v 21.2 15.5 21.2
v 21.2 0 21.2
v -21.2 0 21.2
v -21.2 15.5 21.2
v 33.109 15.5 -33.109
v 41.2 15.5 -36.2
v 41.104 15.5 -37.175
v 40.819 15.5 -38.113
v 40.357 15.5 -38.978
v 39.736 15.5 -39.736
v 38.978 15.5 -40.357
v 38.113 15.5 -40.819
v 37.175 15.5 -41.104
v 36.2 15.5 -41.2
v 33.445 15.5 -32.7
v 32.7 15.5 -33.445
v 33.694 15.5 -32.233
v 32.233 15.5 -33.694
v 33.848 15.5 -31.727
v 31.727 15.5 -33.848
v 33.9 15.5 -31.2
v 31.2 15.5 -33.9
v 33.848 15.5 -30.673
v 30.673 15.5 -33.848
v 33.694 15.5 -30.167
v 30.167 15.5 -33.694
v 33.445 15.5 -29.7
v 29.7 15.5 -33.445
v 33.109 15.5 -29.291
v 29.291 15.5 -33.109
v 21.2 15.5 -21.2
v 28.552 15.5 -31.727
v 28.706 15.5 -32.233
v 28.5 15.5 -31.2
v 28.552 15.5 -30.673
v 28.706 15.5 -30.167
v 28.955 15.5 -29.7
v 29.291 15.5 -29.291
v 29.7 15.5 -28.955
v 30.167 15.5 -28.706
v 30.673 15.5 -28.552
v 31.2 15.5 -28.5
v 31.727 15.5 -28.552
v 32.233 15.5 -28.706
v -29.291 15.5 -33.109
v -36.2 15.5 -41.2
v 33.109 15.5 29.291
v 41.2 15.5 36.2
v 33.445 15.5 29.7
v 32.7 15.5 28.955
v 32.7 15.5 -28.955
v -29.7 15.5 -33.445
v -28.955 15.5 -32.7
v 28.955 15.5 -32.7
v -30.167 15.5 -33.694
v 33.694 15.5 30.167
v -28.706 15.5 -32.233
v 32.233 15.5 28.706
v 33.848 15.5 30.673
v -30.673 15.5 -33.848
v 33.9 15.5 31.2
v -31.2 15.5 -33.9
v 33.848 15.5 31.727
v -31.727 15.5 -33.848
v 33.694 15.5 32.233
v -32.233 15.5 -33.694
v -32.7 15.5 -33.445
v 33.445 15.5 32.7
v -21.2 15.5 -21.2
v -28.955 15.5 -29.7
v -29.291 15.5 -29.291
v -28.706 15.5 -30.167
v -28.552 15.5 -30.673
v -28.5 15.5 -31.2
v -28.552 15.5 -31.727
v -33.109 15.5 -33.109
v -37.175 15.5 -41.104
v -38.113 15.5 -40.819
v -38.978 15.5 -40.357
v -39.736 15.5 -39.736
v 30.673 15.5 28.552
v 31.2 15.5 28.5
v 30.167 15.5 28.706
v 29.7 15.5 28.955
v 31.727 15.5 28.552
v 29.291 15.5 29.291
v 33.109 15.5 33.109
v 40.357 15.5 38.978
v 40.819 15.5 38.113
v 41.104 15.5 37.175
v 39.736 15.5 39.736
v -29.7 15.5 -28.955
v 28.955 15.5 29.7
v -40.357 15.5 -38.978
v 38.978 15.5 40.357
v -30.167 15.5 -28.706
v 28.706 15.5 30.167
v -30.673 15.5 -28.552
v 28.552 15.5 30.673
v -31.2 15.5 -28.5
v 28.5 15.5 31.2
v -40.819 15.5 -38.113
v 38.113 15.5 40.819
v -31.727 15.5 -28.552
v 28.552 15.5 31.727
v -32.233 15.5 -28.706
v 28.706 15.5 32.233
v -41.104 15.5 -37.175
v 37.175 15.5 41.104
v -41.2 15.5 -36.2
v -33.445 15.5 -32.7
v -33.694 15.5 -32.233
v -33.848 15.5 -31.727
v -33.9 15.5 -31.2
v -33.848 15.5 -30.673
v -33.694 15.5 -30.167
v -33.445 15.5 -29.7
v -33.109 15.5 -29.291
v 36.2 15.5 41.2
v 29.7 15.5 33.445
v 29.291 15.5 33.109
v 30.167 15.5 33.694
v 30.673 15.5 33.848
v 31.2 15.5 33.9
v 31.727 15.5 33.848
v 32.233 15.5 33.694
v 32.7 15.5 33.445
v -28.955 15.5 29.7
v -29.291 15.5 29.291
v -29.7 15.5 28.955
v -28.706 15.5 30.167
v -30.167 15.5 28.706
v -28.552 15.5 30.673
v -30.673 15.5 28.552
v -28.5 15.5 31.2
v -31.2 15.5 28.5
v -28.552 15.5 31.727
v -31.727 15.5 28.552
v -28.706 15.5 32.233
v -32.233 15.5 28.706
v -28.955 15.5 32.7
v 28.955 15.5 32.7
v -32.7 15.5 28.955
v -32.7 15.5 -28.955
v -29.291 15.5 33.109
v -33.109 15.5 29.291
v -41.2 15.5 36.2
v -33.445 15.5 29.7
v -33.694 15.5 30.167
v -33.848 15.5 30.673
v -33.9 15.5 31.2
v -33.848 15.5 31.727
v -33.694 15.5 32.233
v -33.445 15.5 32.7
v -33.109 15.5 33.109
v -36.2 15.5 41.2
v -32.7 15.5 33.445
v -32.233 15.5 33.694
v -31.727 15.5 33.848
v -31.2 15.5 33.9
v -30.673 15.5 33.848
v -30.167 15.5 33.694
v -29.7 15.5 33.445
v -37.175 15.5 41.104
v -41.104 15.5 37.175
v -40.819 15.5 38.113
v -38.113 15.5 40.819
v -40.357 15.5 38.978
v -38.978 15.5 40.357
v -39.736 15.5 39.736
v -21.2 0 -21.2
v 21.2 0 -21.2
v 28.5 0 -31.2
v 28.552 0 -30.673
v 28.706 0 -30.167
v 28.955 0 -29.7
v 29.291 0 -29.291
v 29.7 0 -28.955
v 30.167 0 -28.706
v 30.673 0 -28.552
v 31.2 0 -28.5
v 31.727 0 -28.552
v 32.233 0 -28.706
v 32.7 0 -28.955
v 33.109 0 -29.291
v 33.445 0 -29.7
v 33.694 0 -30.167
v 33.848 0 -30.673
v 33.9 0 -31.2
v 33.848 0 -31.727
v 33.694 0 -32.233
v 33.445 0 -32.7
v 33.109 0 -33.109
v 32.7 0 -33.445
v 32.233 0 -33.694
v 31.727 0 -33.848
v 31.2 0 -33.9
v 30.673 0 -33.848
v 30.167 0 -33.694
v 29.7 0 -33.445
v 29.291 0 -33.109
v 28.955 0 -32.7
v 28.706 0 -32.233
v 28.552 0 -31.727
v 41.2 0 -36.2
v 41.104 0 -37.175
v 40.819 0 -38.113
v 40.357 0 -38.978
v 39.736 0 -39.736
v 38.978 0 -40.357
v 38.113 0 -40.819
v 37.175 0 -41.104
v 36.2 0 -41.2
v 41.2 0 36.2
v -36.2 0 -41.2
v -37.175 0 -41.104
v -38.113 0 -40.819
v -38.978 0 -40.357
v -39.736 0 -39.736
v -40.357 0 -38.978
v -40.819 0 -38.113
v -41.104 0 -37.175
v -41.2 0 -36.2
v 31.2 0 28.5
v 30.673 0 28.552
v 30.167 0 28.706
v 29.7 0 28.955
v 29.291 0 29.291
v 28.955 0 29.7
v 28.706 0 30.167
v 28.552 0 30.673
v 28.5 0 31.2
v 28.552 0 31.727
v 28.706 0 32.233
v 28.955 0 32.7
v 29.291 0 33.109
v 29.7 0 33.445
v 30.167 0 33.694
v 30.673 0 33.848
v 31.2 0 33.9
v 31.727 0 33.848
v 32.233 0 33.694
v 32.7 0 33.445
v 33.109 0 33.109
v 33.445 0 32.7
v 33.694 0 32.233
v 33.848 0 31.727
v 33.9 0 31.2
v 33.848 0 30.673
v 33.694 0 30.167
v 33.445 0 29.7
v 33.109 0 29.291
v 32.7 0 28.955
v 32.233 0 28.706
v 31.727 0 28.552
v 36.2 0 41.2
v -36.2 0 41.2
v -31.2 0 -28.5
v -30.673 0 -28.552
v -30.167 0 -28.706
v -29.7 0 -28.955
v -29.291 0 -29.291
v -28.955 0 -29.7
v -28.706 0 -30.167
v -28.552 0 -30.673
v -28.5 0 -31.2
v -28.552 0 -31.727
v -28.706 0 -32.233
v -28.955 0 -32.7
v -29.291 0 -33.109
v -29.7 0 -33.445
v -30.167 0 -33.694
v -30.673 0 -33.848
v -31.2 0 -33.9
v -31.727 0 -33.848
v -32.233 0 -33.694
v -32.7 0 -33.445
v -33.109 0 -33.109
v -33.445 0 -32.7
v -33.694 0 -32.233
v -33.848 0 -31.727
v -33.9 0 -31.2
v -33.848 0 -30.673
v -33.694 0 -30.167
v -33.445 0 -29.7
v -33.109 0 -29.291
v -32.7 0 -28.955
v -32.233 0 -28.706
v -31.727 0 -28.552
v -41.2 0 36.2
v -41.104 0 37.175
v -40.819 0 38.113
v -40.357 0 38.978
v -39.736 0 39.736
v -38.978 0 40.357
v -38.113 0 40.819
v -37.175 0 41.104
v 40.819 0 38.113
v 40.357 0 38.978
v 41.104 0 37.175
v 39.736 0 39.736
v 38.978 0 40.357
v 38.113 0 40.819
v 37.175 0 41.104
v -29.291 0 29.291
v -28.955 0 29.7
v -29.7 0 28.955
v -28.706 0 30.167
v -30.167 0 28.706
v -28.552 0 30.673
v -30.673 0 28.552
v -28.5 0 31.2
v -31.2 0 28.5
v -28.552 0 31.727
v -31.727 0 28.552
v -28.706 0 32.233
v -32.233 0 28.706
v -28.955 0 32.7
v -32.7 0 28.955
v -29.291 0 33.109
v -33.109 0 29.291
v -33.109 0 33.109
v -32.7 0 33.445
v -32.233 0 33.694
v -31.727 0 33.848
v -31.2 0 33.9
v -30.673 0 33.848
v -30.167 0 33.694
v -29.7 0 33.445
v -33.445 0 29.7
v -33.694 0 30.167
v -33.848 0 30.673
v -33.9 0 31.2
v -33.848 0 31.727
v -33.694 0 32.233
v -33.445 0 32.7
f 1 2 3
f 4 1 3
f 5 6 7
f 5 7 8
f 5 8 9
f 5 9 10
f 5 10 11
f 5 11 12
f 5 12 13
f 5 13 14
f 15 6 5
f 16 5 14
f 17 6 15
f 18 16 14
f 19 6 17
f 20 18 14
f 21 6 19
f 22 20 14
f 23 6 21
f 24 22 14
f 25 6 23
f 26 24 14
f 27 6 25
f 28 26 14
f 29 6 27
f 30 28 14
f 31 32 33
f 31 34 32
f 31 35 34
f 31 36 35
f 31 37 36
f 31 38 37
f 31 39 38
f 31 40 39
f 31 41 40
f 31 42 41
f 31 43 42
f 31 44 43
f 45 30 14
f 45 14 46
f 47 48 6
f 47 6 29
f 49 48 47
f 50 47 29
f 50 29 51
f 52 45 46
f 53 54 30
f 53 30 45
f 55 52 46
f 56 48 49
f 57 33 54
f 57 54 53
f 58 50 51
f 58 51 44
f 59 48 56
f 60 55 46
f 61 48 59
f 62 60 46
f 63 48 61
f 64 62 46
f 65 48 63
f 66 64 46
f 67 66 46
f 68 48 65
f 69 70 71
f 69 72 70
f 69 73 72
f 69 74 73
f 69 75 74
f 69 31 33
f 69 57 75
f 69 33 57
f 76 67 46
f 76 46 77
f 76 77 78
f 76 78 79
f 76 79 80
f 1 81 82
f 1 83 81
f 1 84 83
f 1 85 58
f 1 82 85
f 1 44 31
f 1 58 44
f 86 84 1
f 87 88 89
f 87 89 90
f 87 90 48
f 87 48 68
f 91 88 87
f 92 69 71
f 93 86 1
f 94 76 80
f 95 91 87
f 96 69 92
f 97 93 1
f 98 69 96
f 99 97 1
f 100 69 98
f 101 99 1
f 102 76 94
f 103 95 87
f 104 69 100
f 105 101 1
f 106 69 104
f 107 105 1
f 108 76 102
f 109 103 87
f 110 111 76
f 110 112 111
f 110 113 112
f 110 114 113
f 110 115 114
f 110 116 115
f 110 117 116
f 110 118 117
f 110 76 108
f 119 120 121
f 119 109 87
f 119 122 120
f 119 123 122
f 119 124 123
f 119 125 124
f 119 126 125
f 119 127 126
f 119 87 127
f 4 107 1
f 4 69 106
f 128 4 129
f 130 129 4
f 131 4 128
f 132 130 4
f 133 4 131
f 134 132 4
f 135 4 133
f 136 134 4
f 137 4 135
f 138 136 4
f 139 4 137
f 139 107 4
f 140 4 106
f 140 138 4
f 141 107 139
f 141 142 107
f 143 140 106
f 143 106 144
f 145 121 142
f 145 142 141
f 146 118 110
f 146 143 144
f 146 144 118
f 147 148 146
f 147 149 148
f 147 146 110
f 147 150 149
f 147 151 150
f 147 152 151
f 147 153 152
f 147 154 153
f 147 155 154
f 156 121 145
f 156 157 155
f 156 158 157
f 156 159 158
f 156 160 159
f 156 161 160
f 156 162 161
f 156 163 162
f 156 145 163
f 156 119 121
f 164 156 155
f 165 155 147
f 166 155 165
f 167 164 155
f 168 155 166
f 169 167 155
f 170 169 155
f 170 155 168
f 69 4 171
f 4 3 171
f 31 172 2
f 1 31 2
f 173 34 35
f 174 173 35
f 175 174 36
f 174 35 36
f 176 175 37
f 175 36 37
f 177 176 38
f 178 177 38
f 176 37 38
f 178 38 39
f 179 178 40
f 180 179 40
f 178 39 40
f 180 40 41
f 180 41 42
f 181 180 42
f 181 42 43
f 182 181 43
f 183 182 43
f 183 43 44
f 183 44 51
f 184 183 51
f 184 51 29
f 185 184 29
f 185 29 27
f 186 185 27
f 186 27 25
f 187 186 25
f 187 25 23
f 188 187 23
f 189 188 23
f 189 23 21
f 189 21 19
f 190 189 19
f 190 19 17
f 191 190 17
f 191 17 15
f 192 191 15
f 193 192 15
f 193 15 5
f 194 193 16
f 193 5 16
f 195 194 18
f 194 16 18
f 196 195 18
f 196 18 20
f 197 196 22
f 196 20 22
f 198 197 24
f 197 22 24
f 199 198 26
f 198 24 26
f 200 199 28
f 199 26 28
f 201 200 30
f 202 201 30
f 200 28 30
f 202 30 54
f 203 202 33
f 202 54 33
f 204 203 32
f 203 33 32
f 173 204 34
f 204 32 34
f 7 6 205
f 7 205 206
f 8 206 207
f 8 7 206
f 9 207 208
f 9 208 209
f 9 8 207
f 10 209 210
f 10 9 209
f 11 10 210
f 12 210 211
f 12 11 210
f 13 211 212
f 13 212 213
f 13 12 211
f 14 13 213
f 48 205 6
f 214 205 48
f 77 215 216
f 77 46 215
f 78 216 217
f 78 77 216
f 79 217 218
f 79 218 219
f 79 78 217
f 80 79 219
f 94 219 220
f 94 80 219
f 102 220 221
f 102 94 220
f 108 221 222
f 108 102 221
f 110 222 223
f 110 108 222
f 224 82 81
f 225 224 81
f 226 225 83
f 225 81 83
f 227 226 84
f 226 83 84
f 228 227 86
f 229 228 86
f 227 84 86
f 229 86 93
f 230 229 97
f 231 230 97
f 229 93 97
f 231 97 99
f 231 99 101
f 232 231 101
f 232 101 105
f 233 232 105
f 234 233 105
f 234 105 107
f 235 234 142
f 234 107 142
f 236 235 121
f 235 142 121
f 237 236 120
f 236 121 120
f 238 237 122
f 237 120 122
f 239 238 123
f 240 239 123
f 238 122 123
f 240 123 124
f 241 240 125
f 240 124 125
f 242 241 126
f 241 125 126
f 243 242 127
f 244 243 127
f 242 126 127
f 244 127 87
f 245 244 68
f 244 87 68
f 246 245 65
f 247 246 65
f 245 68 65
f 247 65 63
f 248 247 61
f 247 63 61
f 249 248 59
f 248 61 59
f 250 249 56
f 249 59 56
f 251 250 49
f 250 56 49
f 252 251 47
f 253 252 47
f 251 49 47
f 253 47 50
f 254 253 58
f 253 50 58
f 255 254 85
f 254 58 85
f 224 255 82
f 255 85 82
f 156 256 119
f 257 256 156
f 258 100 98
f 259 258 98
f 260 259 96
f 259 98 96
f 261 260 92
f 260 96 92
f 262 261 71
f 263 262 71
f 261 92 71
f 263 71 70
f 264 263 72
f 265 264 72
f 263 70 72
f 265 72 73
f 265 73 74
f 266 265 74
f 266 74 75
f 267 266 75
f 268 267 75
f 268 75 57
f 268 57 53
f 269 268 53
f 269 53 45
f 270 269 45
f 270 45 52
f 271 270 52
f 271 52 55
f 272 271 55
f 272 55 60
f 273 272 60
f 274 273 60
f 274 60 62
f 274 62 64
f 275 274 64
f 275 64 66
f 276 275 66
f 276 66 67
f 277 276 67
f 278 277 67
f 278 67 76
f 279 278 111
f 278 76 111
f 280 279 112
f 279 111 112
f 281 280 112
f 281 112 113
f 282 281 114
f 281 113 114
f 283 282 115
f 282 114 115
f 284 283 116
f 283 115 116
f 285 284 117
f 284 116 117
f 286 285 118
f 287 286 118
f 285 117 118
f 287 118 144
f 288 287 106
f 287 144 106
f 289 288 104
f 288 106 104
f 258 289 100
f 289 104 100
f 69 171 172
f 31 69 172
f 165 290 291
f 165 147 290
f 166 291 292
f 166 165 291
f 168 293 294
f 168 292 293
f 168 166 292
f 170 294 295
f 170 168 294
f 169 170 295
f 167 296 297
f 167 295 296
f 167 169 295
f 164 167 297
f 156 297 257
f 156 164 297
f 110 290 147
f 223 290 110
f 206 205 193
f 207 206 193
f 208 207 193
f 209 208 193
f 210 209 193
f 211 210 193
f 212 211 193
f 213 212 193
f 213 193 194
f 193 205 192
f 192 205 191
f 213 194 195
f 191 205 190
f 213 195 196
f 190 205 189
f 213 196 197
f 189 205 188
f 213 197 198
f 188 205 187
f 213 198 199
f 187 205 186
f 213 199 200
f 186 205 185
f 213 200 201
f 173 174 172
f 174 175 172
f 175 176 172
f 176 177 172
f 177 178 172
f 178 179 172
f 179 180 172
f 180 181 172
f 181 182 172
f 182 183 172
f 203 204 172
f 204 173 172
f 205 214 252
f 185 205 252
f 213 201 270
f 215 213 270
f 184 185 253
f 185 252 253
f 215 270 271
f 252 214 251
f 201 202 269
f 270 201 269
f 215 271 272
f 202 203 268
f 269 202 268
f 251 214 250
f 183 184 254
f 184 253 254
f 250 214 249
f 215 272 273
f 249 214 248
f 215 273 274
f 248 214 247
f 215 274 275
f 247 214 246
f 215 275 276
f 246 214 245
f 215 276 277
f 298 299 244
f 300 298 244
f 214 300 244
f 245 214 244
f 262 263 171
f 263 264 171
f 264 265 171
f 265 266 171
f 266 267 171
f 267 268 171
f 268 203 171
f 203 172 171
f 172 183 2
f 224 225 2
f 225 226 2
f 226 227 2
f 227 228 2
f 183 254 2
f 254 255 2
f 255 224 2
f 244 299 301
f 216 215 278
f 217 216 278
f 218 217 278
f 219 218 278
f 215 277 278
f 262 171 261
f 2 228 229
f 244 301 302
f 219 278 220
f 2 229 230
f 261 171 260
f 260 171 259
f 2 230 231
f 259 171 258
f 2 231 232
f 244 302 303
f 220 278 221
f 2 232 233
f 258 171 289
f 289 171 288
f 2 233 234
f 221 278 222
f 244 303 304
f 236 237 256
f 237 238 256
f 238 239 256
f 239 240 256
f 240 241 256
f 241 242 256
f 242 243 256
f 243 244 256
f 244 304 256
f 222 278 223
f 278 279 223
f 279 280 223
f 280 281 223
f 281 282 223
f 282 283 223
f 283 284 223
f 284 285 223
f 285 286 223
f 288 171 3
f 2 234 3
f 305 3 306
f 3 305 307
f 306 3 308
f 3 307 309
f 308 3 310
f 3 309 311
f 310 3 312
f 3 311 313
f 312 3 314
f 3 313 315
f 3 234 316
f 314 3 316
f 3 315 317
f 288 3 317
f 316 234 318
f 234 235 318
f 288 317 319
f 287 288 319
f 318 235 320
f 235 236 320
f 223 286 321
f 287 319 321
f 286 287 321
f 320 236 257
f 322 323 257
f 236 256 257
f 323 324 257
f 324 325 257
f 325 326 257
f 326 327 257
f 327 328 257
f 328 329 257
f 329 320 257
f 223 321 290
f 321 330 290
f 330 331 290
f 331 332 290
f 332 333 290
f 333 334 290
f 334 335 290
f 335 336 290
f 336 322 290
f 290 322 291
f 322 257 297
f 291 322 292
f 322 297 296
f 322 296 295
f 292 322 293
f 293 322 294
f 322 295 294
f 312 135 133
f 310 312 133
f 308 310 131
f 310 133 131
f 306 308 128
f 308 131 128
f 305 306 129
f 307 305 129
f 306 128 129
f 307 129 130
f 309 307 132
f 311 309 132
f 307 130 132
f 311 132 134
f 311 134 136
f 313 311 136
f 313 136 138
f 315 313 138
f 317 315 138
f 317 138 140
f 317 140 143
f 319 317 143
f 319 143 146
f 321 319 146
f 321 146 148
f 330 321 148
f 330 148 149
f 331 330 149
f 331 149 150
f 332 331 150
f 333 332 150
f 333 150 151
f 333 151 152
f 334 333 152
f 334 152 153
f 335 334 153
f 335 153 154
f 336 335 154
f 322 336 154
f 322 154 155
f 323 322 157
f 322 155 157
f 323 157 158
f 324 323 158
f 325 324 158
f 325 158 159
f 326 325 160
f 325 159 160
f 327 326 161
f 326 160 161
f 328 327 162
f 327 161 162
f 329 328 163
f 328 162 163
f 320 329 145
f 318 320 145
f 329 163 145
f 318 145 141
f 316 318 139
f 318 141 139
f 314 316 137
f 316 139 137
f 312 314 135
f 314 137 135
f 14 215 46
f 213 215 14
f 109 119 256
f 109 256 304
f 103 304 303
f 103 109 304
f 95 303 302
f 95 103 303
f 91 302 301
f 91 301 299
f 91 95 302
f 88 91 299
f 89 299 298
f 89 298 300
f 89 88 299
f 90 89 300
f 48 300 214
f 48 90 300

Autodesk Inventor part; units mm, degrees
ref_plane "YZ Plane" through (0, 0, 0) normal (1, 0, 0) x (0, 1, 0)
ref_plane "XZ Plane" through (0, 0, 0) normal (0, 1, 0) x (-1, 0, 0)
ref_plane "XY Plane" through (0, 0, 0) normal (0, 0, 1) x (1, 0, 0)
sketch "Boceto1" plane through (0, 0, 0) normal (0, 1, 0) x (-1, 0, 0)
  line L0 (-41.2, 41.2) -> (41.2, 41.2)
  line L1 (41.2, 41.2) -> (41.2, -41.2)
  line L2 (41.2, -41.2) -> (-41.2, -41.2)
  line L3 (-41.2, -41.2) -> (-41.2, 41.2)
  line L4 (-41.2, 41.2) -> (41.2, -41.2) construction
  line L5 (41.2, 41.2) -> (-41.2, -41.2) construction
  line L6 (-21.2, 21.2) -> (21.2, 21.2)
  line L7 (21.2, 21.2) -> (21.2, -21.2)
  line L8 (21.2, -21.2) -> (-21.2, -21.2)
  line L9 (-21.2, -21.2) -> (-21.2, 21.2)
  line L10 (-21.2, 21.2) -> (21.2, -21.2) construction
  line L11 (21.2, 21.2) -> (-21.2, -21.2) construction
  point P0 (0, 0)
  dimension "d0" = 82.4
  dimension "d1" = 82.4
  dimension "d2" = 42.4
  dimension "d3" = 42.4
extrude "Extrusión1" add sketch "Boceto1" along normal blind 15.5
sketch "Boceto2" plane through (0, 15.5, 0) normal (0, 1, 0) x (1, 0, 0)
  circle A0 centre (-31.2, -31.2) radius 2.7
  line L0 (-41.2, 41.2) -> (-41.2, -41.2) projected
  line L1 (-41.2, -41.2) -> (41.2, -41.2) projected
  point P0 (0, 0)
  dimension "d6" = 10
  dimension "d7" = 10
  dimension "d8" = 5.4
extrude "Extrusión2" cut sketch "Boceto2" against normal through all
fillet "Empalme1" radius 5 1 edges at (-41.2, 7.75, 41.2)
pattern_circular "Patrón circular1" count 4 over 360 about axis through (0, -10, 0) along (0, 1, 0) of "Extrusión2", "Empalme1"
properties part number "ExtraBase"
